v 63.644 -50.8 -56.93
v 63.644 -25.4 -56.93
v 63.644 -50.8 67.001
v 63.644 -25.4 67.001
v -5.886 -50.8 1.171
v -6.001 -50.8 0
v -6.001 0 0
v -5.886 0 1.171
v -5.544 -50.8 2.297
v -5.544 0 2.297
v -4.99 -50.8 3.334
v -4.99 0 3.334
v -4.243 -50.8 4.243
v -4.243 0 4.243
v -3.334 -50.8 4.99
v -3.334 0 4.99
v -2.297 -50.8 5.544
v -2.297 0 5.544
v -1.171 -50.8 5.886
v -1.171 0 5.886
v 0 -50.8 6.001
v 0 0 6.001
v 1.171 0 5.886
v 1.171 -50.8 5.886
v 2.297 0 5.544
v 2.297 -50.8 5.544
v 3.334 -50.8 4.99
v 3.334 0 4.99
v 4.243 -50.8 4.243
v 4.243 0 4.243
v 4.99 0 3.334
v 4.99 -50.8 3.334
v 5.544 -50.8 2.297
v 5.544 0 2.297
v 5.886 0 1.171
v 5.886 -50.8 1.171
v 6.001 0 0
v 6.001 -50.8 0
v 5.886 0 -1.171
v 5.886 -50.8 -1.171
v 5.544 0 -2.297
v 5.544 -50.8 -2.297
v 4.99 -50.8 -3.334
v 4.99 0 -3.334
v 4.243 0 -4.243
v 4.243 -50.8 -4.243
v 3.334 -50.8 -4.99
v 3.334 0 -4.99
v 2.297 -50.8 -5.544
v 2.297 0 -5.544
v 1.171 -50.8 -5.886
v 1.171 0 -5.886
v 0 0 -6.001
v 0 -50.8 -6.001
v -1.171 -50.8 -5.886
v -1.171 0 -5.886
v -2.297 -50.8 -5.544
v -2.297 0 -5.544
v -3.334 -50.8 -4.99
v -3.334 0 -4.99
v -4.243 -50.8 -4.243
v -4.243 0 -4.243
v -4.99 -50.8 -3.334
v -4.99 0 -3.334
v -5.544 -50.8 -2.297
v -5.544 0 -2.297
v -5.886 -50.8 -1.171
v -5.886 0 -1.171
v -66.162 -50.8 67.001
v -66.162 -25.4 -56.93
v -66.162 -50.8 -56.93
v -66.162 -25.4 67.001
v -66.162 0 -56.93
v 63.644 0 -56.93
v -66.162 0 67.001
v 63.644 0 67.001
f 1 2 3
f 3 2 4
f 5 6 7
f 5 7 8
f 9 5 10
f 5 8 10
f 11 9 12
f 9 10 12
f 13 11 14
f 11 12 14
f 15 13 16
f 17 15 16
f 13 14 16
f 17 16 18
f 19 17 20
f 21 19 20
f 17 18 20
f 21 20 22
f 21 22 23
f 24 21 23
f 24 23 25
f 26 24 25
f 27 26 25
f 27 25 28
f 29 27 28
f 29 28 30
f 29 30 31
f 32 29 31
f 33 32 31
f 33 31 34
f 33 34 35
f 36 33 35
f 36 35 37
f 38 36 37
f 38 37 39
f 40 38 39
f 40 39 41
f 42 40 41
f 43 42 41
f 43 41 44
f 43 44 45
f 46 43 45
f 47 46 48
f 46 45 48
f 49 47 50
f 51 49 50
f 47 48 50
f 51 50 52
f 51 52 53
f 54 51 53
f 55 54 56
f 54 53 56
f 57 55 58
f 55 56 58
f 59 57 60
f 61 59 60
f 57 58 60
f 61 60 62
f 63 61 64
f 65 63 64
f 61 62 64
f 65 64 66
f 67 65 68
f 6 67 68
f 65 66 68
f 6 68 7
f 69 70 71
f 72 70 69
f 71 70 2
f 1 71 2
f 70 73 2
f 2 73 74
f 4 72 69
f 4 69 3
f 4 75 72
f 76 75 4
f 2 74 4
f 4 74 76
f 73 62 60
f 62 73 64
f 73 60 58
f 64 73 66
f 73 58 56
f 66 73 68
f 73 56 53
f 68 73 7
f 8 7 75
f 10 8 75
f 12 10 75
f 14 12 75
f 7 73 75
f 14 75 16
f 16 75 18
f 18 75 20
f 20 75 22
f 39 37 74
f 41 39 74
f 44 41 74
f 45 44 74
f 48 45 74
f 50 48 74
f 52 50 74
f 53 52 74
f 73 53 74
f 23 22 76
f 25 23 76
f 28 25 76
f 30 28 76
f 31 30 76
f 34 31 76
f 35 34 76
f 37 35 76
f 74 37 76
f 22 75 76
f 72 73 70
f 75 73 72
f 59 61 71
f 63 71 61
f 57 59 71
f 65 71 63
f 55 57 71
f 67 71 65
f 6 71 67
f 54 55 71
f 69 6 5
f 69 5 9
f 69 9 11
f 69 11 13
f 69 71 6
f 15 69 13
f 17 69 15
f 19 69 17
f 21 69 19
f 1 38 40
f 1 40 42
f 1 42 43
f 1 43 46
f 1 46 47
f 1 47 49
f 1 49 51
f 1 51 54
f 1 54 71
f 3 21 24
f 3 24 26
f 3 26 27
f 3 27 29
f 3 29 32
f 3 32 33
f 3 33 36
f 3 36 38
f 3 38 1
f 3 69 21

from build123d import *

# Parameters (mm, degrees)
F0_W      = 129.806437
F0_H      = 123.931572
F1_DEPTH  = 25.4
F1_FACE_W = 129.806436
F1_FACE_H = 123.931572
F2_DEPTH  = 25.4
F3_R      = 6.001171
F4_DEPTH  = 78.486


with BuildPart() as f1:
    # F0 (on Front) → F1 (new body)
    with BuildSketch(Plane.XZ):
        with Locations((-1.258898, 5.035594)):
            Rectangle(F0_W, F0_H)
    extrude(amount=F1_DEPTH)

    # F1_face (on face) → F2 (join)
    with BuildSketch(Plane(origin=(-1.258899, -25.4, 5.035594), x_dir=(1, 0, 0), z_dir=(0, -1, 0))):
        Rectangle(F1_FACE_W, F1_FACE_H)
    extrude(amount=F2_DEPTH)

    # F3 (on face) → F4 (cut)
    with BuildSketch(Plane(origin=(0, 0, 0), x_dir=(-1, 0, 0), z_dir=(0, 1, 0))):
        Circle(F3_R)
    extrude(amount=-F4_DEPTH, mode=Mode.SUBTRACT)


solid = f1.part
